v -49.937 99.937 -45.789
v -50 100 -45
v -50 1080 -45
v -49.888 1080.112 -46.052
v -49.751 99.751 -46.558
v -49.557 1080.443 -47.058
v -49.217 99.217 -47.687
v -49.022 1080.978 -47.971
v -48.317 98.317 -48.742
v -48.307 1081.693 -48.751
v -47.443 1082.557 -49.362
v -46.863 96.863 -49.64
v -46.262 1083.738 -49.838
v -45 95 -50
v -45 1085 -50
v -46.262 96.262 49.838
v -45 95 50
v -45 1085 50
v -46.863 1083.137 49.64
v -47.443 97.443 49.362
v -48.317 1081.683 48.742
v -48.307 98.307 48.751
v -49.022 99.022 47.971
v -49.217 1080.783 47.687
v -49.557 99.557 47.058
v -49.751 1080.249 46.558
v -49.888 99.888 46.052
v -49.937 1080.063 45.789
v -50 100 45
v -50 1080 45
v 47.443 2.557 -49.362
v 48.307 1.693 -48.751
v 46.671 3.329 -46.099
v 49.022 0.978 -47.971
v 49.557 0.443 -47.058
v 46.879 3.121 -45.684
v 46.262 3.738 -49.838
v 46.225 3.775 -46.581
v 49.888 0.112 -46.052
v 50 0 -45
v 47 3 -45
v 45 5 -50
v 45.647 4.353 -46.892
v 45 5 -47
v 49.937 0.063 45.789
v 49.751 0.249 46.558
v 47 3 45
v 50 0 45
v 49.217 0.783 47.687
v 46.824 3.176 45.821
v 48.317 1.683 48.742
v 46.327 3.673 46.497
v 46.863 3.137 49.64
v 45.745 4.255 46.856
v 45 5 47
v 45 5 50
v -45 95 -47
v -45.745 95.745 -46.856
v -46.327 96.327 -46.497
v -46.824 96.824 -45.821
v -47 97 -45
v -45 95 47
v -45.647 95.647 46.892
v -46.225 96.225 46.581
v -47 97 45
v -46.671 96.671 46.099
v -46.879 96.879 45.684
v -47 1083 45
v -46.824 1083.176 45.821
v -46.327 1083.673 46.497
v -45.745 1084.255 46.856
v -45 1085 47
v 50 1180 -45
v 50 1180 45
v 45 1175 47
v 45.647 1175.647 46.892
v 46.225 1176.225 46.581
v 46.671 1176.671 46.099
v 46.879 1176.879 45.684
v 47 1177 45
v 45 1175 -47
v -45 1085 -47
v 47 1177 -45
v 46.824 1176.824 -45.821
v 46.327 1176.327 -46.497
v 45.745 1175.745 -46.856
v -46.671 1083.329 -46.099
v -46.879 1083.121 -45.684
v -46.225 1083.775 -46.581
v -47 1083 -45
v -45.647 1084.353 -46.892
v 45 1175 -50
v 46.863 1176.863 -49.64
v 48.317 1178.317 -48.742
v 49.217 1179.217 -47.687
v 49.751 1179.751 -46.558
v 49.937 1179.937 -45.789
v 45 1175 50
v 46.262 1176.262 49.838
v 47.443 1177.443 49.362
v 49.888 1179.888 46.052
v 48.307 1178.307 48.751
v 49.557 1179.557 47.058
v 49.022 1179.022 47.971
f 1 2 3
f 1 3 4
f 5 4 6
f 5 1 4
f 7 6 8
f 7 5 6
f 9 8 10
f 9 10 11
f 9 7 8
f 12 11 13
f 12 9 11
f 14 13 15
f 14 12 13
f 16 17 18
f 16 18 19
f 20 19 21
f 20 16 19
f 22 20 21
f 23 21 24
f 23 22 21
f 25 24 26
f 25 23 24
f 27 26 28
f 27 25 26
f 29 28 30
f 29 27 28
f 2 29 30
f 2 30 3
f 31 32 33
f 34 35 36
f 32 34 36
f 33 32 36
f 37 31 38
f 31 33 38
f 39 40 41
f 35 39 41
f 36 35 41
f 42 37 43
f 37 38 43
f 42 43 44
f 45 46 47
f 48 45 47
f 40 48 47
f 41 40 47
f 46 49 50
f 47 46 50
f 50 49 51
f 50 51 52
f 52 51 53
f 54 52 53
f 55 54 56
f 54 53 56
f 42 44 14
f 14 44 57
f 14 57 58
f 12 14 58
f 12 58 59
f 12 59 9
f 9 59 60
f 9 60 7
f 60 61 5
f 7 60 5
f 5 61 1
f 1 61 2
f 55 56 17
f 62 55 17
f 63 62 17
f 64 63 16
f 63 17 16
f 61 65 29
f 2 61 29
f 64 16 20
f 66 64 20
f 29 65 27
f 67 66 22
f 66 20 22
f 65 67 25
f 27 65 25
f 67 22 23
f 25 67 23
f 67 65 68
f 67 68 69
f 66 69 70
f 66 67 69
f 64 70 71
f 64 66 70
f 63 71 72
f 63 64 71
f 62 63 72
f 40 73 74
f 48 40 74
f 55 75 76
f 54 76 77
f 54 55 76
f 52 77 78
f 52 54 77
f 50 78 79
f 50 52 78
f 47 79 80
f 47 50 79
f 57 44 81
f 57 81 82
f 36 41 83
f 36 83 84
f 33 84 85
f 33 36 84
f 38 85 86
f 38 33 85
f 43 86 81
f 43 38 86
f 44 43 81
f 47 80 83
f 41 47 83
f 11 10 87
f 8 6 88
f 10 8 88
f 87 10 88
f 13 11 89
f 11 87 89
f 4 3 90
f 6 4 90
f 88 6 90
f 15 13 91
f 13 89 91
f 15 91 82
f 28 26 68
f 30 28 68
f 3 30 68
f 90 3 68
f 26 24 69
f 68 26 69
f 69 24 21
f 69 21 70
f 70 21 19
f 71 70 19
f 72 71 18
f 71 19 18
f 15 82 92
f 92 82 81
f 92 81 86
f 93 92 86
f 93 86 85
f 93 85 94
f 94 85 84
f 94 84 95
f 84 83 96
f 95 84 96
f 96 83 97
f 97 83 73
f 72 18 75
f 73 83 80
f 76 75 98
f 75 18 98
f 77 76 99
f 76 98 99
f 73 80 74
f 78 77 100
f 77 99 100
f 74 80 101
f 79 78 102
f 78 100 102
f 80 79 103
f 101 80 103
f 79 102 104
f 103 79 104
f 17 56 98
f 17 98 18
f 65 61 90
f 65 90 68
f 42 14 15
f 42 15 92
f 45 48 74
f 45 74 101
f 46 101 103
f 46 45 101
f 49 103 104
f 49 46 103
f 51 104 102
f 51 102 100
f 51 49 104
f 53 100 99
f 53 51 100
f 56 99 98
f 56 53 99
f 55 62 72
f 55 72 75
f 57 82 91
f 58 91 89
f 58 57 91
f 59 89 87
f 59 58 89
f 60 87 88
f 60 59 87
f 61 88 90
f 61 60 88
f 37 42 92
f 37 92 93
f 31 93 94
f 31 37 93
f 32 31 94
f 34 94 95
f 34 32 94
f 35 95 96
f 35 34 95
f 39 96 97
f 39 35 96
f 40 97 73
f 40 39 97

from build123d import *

# Parameters (mm, degrees)
F1_DEPTH = 1180
F4_DEPTH = 100.001
F5_DEPTH = 100.001


with BuildPart() as f1:
    # F0 (on Front) → F1 (new body)
    with BuildSketch(Plane.XZ):
        with BuildLine():
            ThreePointArc((50, 45), (48.5355339059, 48.5355339059), (45, 50))
            Line((45, 50), (-45, 50))
            ThreePointArc((-45, 50), (-48.5355339059, 48.5355339059), (-50, 45))
            Line((-50, 45), (-50, -45))
            ThreePointArc((-50, -45), (-48.5355339059, -48.5355339059), (-45, -50))
            Line((-45, -50), (45, -50))
            ThreePointArc((45, -50), (48.5355339059, -48.5355339059), (50, -45))
            Line((50, -45), (50, 45))
        make_face()
        with BuildLine():
            ThreePointArc((-47, 45), (-46.4142135624, 46.4142135624), (-45, 47))
            Line((-45, 47), (45, 47))
            ThreePointArc((45, 47), (46.4142135624, 46.4142135624), (47, 45))
            Line((47, 45), (47, -45))
            ThreePointArc((47, -45), (46.4142135624, -46.4142135624), (45, -47))
            Line((45, -47), (-45, -47))
            ThreePointArc((-45, -47), (-46.4142135624, -46.4142135624), (-47, -45))
            Line((-47, -45), (-47, 45))
        make_face(mode=Mode.SUBTRACT)
    extrude(amount=-F1_DEPTH)

    # F3 (on offset) → F4 (cut, through all)
    with BuildSketch(Plane.XY.offset(50)):
        Polygon((-50, 100), (-50, 0), (50, 0), align=None)
    extrude(amount=-F4_DEPTH, mode=Mode.SUBTRACT)

    # F3 (on offset) → F5 (cut, through all)
    with BuildSketch(Plane.XY.offset(50)):
        Polygon((-50, 100), (-50, 0), (50, 0), align=None)
        Polygon((50, 1180), (-50, 1180), (-50, 1080), align=None)
    extrude(amount=-F5_DEPTH, mode=Mode.SUBTRACT)


solid = f1.part
